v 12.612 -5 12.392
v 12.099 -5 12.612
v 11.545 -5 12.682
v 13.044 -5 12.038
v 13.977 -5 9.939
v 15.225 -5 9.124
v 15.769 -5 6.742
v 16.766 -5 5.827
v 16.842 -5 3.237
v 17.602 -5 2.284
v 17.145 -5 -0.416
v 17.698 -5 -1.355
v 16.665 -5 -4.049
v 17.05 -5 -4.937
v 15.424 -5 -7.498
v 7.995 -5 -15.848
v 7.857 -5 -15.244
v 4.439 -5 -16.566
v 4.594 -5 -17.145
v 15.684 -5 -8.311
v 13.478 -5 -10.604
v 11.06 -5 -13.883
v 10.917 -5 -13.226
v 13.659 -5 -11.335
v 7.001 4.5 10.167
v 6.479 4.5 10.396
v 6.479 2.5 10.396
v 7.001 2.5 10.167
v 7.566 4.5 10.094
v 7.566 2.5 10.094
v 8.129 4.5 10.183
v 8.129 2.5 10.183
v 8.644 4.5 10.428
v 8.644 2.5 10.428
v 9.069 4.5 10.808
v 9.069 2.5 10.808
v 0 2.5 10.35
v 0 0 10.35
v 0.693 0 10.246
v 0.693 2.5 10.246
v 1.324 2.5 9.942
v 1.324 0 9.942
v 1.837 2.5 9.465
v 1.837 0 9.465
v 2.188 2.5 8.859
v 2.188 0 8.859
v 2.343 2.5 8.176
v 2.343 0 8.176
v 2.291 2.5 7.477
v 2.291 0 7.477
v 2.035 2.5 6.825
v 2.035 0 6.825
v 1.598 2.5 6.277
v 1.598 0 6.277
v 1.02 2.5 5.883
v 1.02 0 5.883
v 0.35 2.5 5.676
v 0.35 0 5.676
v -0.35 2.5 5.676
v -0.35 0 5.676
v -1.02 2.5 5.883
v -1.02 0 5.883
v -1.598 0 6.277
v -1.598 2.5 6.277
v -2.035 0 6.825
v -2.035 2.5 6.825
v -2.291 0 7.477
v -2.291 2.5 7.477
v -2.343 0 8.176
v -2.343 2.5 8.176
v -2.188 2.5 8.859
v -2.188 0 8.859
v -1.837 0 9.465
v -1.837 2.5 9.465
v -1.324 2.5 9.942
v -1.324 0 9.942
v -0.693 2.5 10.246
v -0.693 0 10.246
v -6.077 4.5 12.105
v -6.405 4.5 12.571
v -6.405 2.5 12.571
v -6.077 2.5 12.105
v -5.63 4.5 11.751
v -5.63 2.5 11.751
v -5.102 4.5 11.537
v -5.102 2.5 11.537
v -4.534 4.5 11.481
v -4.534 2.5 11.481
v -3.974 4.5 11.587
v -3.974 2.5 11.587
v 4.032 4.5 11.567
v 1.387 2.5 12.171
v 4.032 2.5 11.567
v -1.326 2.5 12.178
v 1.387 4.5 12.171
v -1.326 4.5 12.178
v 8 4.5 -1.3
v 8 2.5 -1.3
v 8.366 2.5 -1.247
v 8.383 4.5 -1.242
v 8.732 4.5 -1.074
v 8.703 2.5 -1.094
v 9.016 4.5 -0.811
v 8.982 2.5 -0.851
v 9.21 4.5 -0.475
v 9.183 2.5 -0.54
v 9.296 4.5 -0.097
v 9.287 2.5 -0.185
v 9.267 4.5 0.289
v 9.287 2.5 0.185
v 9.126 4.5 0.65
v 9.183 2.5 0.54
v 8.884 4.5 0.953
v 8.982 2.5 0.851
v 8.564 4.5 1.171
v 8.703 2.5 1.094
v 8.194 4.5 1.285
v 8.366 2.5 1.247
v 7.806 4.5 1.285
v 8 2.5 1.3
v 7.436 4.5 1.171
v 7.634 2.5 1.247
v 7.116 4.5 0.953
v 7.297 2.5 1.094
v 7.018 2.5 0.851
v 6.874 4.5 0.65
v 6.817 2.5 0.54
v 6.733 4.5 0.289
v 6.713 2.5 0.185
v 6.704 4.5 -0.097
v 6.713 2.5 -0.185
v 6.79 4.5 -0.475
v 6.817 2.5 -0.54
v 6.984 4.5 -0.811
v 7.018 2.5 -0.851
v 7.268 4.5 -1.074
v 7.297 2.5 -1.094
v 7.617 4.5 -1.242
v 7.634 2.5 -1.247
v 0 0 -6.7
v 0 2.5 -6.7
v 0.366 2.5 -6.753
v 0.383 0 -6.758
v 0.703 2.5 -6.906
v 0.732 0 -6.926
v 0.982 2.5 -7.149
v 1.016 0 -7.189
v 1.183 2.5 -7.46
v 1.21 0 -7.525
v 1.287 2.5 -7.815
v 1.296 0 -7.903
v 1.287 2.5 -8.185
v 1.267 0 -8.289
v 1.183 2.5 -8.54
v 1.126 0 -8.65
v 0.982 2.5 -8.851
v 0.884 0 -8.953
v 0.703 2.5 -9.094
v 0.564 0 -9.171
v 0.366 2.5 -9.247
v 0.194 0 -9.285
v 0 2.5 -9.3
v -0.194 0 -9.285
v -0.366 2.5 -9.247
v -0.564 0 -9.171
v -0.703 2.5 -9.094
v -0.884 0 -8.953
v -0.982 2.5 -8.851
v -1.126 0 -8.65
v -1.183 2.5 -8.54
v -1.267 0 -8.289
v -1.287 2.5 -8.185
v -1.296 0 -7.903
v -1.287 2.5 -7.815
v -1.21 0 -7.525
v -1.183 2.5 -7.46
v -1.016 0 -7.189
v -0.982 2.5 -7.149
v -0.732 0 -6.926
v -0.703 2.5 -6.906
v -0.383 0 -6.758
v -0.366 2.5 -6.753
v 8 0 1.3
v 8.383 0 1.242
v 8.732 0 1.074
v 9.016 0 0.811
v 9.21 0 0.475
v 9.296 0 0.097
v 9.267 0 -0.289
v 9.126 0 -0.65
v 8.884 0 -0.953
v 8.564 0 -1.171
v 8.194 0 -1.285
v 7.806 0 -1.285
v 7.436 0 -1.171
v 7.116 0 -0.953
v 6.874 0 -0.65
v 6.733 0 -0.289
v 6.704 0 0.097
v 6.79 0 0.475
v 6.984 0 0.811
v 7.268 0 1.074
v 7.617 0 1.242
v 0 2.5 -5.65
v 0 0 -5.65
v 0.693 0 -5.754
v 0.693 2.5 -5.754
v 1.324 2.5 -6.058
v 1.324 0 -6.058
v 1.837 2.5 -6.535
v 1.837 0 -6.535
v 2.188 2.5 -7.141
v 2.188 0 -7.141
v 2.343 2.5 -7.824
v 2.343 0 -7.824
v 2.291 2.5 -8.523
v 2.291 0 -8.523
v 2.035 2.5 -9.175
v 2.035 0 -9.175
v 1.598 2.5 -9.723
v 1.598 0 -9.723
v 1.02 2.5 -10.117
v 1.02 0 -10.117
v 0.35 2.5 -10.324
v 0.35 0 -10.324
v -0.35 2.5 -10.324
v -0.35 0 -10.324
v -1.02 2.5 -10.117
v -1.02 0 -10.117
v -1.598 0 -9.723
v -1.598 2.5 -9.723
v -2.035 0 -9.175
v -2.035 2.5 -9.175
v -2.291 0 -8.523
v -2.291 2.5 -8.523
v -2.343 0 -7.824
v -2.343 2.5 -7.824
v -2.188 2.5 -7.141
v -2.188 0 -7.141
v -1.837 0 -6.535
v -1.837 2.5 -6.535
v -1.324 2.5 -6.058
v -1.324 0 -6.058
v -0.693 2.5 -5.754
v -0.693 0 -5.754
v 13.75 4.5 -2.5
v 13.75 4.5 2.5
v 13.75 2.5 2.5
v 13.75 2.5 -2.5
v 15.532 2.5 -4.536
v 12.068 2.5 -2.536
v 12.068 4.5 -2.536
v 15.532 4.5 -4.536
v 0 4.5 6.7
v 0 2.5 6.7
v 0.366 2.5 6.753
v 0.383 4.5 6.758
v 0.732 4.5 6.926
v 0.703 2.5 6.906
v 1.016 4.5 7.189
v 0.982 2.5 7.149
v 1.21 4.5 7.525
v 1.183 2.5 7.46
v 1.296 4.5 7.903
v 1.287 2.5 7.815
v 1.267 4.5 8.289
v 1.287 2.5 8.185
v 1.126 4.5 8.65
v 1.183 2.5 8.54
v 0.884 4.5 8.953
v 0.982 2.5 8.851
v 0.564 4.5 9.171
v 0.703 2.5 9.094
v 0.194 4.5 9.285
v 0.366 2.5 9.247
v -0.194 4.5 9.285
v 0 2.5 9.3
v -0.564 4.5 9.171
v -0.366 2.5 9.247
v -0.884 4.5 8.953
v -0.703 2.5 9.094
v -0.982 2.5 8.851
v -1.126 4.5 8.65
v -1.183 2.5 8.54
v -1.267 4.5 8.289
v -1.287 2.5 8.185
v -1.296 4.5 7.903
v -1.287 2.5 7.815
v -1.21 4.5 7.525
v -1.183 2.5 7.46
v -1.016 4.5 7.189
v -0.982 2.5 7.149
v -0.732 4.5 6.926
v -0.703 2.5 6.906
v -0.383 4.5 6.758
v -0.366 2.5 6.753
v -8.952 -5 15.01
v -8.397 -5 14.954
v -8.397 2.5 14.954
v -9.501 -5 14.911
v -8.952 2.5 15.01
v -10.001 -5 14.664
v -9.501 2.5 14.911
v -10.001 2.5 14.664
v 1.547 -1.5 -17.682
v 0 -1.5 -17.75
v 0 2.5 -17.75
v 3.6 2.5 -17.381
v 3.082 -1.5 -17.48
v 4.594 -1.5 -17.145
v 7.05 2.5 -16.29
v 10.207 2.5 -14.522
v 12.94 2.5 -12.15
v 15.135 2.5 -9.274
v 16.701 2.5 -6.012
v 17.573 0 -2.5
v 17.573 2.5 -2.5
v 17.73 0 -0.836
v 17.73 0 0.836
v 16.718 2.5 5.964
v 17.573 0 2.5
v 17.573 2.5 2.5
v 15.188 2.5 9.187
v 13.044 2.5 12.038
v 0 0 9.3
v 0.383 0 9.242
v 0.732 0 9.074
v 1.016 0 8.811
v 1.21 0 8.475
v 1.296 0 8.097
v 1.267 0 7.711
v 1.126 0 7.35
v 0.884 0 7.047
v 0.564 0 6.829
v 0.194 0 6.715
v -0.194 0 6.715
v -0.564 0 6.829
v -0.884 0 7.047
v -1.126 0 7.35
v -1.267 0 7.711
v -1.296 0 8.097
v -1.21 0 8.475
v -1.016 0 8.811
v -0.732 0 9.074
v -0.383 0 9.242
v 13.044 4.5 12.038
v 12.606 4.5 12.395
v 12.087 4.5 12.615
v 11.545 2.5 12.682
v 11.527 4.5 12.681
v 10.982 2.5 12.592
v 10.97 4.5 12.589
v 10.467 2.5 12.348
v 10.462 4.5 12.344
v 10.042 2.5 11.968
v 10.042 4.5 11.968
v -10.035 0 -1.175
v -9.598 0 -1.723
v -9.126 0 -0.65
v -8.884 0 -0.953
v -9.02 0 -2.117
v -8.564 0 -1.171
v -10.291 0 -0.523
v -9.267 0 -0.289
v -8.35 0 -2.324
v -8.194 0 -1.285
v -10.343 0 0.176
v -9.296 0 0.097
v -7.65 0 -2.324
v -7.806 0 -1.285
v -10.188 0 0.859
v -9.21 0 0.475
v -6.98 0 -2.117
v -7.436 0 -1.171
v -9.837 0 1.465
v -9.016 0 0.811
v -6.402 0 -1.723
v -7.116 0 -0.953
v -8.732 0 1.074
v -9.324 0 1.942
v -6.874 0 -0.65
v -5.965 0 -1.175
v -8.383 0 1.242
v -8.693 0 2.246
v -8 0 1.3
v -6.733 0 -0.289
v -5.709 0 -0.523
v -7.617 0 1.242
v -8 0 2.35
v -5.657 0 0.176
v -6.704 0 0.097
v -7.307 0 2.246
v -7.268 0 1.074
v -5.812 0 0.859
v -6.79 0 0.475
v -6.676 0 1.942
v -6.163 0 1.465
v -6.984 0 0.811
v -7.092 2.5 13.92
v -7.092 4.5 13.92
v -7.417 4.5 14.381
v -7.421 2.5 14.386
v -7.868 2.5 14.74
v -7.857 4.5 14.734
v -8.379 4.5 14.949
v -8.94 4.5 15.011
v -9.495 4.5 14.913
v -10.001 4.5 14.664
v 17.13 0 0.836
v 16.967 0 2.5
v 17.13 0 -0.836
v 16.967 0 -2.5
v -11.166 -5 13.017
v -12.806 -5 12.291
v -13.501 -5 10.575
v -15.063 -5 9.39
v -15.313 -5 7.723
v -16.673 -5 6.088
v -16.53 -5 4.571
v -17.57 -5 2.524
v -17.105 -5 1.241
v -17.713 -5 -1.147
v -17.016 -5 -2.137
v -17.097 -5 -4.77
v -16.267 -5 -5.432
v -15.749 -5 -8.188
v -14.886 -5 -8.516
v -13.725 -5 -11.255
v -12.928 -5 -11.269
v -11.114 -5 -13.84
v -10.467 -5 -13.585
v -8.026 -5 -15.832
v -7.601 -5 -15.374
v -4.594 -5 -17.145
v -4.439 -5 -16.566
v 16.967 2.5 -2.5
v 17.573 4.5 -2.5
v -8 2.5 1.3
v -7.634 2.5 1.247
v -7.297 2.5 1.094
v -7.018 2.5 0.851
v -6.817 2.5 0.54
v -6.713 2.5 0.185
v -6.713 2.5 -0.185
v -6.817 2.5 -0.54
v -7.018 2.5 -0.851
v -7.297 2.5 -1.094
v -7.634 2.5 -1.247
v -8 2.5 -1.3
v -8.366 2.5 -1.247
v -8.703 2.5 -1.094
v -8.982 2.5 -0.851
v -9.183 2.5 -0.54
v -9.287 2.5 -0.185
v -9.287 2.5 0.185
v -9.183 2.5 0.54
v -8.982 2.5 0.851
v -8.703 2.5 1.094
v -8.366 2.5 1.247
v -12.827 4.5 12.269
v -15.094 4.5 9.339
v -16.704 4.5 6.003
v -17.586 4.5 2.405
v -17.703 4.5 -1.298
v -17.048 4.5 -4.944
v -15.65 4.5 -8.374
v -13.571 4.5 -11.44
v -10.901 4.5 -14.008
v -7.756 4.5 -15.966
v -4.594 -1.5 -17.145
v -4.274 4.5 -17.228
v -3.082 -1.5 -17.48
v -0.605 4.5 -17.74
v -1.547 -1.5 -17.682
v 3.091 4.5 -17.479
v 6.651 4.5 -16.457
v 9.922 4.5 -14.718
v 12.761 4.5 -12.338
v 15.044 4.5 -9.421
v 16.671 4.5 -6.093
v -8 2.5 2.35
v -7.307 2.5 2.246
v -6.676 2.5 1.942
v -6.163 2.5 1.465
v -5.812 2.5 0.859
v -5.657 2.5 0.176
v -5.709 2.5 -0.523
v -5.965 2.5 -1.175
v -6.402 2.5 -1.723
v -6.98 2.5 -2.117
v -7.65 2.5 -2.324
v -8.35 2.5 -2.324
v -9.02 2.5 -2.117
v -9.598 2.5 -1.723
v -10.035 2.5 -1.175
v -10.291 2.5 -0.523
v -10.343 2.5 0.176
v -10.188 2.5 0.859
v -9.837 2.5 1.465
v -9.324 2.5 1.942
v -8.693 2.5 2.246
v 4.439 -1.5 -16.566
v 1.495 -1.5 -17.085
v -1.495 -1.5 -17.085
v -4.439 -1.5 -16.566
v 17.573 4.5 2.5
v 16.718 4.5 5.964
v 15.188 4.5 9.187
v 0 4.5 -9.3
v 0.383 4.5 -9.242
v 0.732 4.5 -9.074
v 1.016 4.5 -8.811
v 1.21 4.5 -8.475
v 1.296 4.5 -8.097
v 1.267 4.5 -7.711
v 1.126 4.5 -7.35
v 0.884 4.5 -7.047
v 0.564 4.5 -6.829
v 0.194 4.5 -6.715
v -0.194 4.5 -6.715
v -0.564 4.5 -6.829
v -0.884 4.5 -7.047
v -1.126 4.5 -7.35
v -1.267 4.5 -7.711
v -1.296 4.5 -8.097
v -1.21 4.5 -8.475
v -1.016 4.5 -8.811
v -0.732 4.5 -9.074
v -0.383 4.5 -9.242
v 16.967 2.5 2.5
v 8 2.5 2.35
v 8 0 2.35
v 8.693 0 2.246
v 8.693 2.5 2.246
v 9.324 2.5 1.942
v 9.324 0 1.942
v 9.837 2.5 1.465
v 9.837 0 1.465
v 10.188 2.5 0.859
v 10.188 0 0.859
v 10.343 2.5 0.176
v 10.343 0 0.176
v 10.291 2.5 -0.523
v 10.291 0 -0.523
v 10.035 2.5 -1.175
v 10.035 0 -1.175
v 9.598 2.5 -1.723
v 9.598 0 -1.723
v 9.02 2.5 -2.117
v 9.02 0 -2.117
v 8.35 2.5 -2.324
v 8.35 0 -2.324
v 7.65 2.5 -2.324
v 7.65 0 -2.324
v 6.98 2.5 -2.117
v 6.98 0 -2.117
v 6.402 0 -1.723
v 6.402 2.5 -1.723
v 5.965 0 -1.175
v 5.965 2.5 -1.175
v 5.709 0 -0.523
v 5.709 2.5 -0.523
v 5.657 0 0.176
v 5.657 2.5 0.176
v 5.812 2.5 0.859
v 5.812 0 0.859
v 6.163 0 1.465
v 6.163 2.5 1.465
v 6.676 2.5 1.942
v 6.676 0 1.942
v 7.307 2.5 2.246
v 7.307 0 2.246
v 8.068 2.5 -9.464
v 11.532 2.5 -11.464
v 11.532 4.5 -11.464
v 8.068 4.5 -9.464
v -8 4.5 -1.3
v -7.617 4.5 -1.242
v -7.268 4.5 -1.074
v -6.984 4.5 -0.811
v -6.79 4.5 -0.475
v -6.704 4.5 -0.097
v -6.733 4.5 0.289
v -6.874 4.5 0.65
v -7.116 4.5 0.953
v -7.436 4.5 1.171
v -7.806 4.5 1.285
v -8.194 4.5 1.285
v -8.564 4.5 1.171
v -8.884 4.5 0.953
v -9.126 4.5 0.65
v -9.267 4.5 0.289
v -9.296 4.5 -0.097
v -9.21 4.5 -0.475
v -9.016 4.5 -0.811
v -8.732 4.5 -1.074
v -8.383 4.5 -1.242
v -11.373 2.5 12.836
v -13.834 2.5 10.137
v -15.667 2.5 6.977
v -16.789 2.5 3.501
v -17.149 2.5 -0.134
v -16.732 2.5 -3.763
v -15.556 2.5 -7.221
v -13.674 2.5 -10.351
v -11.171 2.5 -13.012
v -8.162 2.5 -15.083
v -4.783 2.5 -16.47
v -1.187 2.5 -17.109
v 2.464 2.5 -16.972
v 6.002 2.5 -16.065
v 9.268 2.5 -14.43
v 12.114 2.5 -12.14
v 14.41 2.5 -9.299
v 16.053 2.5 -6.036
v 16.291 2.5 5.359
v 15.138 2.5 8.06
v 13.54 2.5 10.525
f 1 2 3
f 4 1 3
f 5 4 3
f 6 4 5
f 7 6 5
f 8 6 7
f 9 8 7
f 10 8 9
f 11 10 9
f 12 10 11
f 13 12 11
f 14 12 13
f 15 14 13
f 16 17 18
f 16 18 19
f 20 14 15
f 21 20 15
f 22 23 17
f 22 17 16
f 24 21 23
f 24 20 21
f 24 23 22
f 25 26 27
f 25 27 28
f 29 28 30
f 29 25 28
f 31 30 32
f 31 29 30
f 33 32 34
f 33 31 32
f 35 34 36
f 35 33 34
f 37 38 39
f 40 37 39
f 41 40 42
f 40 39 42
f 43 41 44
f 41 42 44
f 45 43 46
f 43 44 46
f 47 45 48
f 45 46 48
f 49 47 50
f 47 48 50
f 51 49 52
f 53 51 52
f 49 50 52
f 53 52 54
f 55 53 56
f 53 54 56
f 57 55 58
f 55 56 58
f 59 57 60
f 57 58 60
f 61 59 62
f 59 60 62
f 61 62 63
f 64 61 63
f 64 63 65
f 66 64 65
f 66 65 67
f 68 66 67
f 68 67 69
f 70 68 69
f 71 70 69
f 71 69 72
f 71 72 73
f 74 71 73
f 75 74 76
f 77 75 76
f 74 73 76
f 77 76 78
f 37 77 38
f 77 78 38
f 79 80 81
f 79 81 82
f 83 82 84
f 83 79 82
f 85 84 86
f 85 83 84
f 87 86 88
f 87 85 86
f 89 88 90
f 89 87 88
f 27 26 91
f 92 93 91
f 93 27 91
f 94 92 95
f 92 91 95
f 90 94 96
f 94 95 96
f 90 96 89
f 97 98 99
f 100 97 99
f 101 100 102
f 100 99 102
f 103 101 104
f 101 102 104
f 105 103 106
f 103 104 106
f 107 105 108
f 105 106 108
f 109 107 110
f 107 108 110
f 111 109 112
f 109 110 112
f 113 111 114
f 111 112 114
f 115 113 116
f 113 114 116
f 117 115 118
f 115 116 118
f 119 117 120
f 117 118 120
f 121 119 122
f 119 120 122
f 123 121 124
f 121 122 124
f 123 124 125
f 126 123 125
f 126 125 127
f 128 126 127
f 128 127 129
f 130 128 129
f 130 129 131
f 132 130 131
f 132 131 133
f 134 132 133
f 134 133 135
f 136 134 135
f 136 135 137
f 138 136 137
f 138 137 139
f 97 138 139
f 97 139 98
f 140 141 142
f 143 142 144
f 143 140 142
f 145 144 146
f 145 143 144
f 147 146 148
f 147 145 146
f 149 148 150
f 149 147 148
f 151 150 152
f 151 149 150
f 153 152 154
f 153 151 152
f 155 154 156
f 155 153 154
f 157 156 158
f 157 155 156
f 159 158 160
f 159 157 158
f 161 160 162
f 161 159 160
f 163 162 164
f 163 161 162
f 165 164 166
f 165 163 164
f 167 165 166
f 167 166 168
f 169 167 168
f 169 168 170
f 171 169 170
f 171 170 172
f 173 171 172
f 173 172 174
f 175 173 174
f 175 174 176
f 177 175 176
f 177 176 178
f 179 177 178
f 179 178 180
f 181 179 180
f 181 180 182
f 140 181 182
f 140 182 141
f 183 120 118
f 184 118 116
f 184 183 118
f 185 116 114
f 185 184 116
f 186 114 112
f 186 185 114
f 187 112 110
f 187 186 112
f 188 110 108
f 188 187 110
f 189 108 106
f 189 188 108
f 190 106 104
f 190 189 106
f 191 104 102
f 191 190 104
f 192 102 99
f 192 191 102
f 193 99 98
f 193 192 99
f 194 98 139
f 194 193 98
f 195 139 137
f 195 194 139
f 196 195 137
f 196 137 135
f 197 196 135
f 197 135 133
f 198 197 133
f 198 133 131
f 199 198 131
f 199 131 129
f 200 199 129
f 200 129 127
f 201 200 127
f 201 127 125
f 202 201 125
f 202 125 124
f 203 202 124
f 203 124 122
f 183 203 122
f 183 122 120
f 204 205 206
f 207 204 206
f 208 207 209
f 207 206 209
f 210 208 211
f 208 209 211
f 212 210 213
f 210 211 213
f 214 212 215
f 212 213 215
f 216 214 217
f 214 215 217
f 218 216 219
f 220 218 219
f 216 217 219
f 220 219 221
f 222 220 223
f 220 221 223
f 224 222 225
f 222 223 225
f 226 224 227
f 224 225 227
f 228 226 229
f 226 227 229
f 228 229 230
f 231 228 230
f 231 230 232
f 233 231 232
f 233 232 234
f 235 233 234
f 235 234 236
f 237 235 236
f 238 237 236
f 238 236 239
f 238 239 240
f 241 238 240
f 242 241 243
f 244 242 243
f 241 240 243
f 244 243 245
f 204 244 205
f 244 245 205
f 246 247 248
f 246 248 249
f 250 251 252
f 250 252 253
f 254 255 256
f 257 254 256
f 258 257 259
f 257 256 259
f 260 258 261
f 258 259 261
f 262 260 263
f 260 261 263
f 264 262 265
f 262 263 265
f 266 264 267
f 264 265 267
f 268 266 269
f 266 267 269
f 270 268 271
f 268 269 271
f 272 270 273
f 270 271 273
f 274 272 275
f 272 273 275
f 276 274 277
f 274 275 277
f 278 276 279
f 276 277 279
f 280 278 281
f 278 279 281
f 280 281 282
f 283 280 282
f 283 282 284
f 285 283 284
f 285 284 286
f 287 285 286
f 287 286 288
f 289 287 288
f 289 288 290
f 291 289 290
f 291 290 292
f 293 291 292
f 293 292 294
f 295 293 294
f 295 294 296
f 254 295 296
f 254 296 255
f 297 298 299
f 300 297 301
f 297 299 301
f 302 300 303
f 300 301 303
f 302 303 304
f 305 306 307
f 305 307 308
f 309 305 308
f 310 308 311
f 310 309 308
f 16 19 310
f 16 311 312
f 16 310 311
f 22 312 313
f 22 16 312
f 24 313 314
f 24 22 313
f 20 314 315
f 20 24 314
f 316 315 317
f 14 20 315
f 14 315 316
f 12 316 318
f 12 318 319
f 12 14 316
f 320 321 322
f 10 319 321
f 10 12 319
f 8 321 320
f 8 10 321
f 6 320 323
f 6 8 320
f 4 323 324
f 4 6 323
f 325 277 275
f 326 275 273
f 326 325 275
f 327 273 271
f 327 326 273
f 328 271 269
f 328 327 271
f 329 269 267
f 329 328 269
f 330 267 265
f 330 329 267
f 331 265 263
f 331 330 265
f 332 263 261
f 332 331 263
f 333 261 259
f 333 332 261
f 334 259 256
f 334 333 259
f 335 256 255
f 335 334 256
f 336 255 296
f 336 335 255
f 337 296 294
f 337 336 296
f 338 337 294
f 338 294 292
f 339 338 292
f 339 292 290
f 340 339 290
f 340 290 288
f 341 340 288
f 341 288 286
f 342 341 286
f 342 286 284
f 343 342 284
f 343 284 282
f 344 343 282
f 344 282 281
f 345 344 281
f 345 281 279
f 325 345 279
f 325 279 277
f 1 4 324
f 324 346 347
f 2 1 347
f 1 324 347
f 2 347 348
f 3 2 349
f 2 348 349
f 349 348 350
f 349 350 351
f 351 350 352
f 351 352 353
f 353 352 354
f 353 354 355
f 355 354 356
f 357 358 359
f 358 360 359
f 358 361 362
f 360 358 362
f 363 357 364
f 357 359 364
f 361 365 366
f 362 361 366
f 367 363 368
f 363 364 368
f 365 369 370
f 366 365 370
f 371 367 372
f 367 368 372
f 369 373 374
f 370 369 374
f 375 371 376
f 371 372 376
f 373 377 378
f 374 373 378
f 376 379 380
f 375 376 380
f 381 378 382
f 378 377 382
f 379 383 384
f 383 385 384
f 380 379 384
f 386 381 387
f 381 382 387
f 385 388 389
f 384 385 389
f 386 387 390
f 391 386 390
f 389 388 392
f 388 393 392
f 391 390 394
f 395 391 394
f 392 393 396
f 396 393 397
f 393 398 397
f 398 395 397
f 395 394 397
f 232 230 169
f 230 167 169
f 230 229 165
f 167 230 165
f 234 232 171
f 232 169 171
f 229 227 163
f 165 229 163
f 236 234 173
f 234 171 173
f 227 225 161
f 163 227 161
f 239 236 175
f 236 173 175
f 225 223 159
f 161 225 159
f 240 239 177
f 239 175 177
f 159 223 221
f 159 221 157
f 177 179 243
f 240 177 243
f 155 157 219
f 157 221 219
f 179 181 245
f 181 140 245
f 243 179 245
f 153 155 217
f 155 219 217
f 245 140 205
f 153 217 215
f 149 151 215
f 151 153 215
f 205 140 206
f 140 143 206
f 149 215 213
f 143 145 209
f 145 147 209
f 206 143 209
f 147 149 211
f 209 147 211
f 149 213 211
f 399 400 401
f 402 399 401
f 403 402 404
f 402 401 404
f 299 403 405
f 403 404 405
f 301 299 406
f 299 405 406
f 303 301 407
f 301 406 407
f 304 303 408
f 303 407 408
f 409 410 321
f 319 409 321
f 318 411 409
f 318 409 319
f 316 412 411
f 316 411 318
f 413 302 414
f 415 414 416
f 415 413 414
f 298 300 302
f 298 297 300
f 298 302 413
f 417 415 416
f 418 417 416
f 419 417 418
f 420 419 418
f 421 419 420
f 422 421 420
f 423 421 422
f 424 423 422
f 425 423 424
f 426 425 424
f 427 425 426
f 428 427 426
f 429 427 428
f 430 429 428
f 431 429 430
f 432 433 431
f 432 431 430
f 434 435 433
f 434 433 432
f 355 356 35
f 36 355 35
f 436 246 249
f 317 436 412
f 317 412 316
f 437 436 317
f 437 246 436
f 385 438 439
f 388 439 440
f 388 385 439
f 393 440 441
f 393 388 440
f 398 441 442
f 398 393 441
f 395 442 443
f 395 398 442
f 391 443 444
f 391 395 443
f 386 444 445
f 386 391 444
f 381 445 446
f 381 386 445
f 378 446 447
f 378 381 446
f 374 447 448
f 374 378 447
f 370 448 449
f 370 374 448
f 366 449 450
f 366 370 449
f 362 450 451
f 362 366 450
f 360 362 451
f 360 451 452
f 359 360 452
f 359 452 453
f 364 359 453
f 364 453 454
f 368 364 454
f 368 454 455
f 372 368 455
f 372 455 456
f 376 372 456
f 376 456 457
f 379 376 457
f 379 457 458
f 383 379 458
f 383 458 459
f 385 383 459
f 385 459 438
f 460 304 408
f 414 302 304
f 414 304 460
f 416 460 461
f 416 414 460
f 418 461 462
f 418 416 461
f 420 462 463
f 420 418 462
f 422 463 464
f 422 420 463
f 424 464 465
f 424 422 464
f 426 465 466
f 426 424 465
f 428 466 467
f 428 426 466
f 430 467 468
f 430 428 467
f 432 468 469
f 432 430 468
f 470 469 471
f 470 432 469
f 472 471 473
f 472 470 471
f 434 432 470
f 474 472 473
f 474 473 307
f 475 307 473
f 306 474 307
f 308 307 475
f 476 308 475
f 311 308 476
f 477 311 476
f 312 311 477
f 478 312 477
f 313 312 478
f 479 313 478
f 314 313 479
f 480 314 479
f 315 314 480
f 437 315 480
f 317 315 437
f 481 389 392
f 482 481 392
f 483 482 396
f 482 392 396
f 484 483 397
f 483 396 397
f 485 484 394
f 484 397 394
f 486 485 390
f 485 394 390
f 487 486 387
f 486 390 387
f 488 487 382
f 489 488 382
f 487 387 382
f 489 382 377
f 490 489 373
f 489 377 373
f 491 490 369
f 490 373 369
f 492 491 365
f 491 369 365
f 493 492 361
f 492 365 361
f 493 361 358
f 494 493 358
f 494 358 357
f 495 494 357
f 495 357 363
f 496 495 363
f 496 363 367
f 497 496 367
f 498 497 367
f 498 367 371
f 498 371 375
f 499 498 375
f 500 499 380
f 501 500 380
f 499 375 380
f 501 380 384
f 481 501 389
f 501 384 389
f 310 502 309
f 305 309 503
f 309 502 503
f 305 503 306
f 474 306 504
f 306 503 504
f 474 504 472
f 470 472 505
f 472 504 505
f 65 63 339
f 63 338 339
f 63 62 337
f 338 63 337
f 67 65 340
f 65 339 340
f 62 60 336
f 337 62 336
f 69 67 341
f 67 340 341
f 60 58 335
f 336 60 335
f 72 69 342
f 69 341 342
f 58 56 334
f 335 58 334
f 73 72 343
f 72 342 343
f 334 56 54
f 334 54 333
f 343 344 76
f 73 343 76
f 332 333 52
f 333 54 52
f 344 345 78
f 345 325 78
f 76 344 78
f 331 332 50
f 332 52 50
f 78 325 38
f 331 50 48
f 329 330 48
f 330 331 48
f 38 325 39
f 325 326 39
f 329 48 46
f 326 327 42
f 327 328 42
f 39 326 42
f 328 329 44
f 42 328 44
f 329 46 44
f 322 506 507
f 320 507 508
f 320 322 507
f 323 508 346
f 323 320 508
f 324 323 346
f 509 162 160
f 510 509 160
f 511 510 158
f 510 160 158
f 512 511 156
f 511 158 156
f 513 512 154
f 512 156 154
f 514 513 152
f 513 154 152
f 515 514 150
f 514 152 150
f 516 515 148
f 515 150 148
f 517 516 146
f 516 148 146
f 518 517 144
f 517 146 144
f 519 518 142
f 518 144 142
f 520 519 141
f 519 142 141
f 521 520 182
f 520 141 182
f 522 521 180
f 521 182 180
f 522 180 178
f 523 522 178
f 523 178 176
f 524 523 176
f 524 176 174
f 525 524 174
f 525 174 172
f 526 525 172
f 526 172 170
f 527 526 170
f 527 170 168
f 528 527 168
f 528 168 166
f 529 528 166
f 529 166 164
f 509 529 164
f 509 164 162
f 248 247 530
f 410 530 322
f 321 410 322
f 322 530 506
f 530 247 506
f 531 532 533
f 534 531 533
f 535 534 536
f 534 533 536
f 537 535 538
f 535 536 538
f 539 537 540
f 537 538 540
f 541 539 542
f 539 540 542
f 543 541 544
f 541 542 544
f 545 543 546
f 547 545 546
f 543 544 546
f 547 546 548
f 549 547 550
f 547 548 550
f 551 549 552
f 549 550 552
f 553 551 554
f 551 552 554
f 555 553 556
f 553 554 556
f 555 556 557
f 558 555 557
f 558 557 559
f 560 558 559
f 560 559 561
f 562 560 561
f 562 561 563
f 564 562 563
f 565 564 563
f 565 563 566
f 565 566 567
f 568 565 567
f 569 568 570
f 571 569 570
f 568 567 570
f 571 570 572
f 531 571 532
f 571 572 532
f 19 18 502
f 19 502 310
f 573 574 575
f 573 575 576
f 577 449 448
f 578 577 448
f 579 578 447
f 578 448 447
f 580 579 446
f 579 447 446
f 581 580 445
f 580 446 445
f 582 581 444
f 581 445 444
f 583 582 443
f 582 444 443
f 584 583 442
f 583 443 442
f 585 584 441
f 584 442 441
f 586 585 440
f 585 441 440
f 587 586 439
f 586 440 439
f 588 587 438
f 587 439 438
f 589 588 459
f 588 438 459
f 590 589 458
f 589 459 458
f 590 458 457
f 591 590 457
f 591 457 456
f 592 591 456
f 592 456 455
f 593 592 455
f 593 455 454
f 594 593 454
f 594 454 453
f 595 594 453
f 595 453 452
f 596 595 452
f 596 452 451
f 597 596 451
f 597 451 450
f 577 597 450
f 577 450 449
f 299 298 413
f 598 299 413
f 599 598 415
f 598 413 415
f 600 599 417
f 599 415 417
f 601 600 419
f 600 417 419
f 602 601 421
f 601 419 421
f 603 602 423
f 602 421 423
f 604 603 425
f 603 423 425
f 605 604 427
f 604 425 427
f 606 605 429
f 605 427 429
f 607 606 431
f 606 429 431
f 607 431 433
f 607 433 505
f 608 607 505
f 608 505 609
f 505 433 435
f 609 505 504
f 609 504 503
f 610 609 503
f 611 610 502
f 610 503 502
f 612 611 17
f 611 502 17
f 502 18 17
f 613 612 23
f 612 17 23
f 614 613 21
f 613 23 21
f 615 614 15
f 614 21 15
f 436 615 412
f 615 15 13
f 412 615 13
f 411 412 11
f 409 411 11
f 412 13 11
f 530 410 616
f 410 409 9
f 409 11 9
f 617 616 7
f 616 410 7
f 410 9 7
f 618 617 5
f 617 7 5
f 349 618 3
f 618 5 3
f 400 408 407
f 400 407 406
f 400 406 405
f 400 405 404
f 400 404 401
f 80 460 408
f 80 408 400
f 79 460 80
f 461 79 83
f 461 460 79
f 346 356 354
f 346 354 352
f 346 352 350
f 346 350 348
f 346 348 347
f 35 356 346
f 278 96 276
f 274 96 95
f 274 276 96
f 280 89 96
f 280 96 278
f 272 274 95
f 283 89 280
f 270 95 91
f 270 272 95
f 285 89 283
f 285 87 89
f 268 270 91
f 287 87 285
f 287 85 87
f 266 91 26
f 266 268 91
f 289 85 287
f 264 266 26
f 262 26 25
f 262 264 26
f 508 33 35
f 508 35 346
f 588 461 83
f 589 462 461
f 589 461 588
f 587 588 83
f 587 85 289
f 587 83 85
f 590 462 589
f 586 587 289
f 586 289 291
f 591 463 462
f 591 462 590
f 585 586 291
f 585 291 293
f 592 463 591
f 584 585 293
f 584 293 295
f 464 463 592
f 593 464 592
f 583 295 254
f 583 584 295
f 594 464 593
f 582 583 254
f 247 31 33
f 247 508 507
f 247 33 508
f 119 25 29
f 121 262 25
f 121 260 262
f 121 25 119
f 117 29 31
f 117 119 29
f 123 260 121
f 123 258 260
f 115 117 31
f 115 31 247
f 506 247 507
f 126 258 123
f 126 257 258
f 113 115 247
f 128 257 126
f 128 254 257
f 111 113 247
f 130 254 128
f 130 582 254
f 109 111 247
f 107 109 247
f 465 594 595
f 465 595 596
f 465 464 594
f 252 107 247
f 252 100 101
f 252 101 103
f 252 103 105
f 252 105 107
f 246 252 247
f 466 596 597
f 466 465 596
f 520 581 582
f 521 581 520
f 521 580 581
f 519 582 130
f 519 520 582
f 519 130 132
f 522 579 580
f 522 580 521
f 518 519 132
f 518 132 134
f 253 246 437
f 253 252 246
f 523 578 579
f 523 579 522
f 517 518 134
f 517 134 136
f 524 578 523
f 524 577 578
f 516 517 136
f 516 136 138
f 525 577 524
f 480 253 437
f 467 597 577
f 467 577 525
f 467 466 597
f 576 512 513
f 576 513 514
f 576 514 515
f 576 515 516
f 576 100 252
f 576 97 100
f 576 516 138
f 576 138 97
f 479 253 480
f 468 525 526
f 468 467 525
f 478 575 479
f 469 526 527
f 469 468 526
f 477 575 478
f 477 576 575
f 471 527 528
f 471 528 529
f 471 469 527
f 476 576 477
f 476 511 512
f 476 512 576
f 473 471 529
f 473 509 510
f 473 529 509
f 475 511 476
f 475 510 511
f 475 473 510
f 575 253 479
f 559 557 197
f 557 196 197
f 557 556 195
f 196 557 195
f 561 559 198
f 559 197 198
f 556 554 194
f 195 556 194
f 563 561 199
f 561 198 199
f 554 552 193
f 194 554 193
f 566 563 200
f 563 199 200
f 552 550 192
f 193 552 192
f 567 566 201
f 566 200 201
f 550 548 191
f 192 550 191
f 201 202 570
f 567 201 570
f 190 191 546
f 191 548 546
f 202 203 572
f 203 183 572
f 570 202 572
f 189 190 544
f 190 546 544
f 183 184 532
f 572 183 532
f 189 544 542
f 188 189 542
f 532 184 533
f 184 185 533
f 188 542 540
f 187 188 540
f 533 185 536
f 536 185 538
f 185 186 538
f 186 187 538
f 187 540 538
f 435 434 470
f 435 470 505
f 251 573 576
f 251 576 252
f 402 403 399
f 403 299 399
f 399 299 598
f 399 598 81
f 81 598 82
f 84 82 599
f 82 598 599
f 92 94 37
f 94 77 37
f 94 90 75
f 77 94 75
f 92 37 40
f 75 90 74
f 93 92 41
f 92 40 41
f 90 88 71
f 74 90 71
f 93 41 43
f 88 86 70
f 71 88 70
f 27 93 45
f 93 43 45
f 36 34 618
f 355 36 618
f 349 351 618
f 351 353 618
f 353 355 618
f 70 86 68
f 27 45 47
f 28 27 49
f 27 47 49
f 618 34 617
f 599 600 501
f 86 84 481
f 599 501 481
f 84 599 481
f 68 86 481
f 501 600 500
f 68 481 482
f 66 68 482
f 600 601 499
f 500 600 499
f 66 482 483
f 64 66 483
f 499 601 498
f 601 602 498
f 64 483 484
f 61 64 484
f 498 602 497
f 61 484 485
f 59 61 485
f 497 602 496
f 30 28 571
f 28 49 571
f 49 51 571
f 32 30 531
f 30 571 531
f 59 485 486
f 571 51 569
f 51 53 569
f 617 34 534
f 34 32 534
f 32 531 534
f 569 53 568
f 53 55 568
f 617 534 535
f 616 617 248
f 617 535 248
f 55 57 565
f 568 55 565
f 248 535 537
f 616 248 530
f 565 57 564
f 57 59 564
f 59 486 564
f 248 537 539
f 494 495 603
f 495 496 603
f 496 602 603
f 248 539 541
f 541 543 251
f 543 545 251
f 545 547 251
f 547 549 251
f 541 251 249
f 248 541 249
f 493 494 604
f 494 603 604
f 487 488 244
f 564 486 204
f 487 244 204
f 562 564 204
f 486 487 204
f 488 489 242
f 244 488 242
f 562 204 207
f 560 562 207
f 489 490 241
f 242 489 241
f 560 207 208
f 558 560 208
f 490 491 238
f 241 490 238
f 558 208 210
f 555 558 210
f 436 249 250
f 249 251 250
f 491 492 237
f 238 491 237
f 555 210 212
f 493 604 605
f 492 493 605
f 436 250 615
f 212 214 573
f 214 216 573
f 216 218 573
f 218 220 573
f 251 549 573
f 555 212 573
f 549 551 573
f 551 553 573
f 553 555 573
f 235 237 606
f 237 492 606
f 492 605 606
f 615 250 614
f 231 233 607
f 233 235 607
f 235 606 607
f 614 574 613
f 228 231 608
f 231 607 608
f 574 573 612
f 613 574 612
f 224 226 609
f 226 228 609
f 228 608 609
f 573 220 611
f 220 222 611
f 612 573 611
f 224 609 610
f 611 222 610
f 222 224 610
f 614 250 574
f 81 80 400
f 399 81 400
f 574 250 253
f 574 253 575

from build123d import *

# Parameters (mm, degrees)
SKETCH_1_R               = 2.35
SKETCH_1_R_2             = 1.3
EXTRUDE_1_DEPTH          = 2.5
EXTRUDE_1_2_DEPTH        = 2.5
EXTRUDE_1_3_DEPTH        = 2.5
EXTRUDE_1_4_DEPTH        = 2.5
SKETCH_2_R               = 17.75
EXTRUDE_2_DEPTH          = 2
SKETCH_3_R               = 1.3
CUT_EXTRUDE_1_DEPTH      = 26.226474189
CUT_EXTRUDE_2_DEPTH      = 26.502450863
CUT_EXTRUDE_2_DEPTH_BACK = 26.502450863
EXTRUDE_START            = 7.5
SKETCH_5_R               = 17.75
SKETCH_5_R_2             = 17.15
EXTRUDE_3_DEPTH          = 7.5
SKETCH_6_W               = 4
SKETCH_6_H               = 5
CUT_EXTRUDE_3_DEPTH      = 4.5
CUT_EXTRUDE_4_DEPTH      = 27.839802533
CUT_EXTRUDE_5_DEPTH      = 3.5
FILLET_1_R               = 2


with BuildPart() as part:
    # 草图1 → 凸台-拉伸1 (new body)
    with BuildSketch(Plane(origin=(0, 0, 0), x_dir=(1, 0, 0), z_dir=(0, 1, 0))):
        with Locations((0, 8)):
            Circle(SKETCH_1_R)
        with Locations((0, 8)):
            Circle(SKETCH_1_R_2, mode=Mode.SUBTRACT)
    extrude(amount=EXTRUDE_1_DEPTH)



with BuildPart() as body_2:
    # 草图1 → Extrude 1 2 (new body)
    with BuildSketch(Plane(origin=(0, 0, 0), x_dir=(1, 0, 0), z_dir=(0, 1, 0))):
        with Locations((8, 0)):
            Circle(SKETCH_1_R)
        with Locations((8, 0)):
            Circle(SKETCH_1_R_2, mode=Mode.SUBTRACT)
    extrude(amount=EXTRUDE_1_2_DEPTH)


with BuildPart() as body_3:
    # 草图1 → Extrude 1 3 (new body)
    with BuildSketch(Plane(origin=(0, 0, 0), x_dir=(1, 0, 0), z_dir=(0, 1, 0))):
        with Locations((0, -8)):
            Circle(SKETCH_1_R)
        with Locations((0, -8)):
            Circle(SKETCH_1_R_2, mode=Mode.SUBTRACT)
    extrude(amount=EXTRUDE_1_3_DEPTH)


with BuildPart() as body_4:
    # 草图1 → Extrude 1 4 (new body)
    with BuildSketch(Plane(origin=(0, 0, 0), x_dir=(1, 0, 0), z_dir=(0, 1, 0))):
        with Locations((-8, 0)):
            Circle(SKETCH_1_R)
        with Locations((-8, 0)):
            Circle(SKETCH_1_R_2, mode=Mode.SUBTRACT)
    extrude(amount=EXTRUDE_1_4_DEPTH)


with BuildPart() as part_1:
    add(part.part)

    add(body_2.part)  # 凸台-拉伸2 merges body 2

    add(body_3.part)  # 凸台-拉伸2 merges body 3

    add(body_4.part)  # 凸台-拉伸2 merges body 4
    # 草图2 → 凸台-拉伸2 (add)
    with BuildSketch(Plane(origin=(0, 2.5, 0), x_dir=(1, 0, 0), z_dir=(0, 1, 0))):
        Circle(SKETCH_2_R)
    extrude(amount=EXTRUDE_2_DEPTH)

    # 草图3 → 切除-拉伸1 (cut, through all)
    with BuildSketch(Plane.XZ.offset(-2.5)):
        with Locations((0, -8)):
            Circle(SKETCH_3_R)
        with Locations((8, 0)):
            Circle(SKETCH_3_R)
        with Locations((0, 8)):
            Circle(SKETCH_3_R)
        with Locations((-8, 0)):
            Circle(SKETCH_3_R)
    extrude(amount=-CUT_EXTRUDE_1_DEPTH, mode=Mode.SUBTRACT)

    # 草图4 → 切除-拉伸2 (cut, two sides: drawn at the far end of the back side and taken through both)
    with BuildSketch(Plane(origin=(0, 4.5, 0), x_dir=(1, 0, 0), z_dir=(0, 1, 0)).offset(-CUT_EXTRUDE_2_DEPTH_BACK)):
        Polygon((8.067949046, 9.464101393), (12.067949458, 2.535898401), (15.532050954, 4.535898607), (11.532050542, 11.464101599), align=None)
    extrude(amount=CUT_EXTRUDE_2_DEPTH + CUT_EXTRUDE_2_DEPTH_BACK, mode=Mode.SUBTRACT)

    # 草图5 → 凸台-拉伸3 (add)
    with BuildSketch(Plane.XZ.offset(-2.5).offset(EXTRUDE_START)):
        Circle(SKETCH_5_R)
        Circle(SKETCH_5_R_2, mode=Mode.SUBTRACT)
    extrude(amount=-EXTRUDE_3_DEPTH)

    # 草图6 → 切除-拉伸3 (cut)
    with BuildSketch(Plane(origin=(0, 4.5, 0), x_dir=(1, 0, 0), z_dir=(0, 1, 0))):
        with Locations((15.75, 0)):
            Rectangle(SKETCH_6_W, SKETCH_6_H)
    extrude(amount=-CUT_EXTRUDE_3_DEPTH, mode=Mode.SUBTRACT)

    # 草图7 → 切除-拉伸4 (cut, through all)
    with BuildSketch(Plane(origin=(0, 4.5, 0), x_dir=(1, 0, 0), z_dir=(0, 1, 0))):
        with BuildLine():
            Line((11.409480072, -13.597288865), (7.874148219, -9.384044428))
            ThreePointArc((7.874148219, -9.384044428), (1.386739369, -12.171255232), (-5.561383622, -10.914829921))
            Line((-5.561383622, -10.914829921), (-8.05833137, -15.815365804))
            ThreePointArc((-8.05833137, -15.815365804), (2.009357044, -17.635900438), (11.409480072, -13.597288865))
        make_face()
    extrude(amount=-CUT_EXTRUDE_4_DEPTH, mode=Mode.SUBTRACT)

    # 草图8 → 切除-拉伸5 (cut)
    with BuildSketch(Plane.XZ.offset(5)):
        with BuildLine():
            Line((-4.594038051, -17.145183417), (-4.438746624, -16.565627921))
            ThreePointArc((-4.438746624, -16.565627921), (0, -17.15), (4.438746624, -16.565627921))
            Line((4.438746624, -16.565627921), (4.594038051, -17.145183417))
            ThreePointArc((4.594038051, -17.145183417), (0, -17.75), (-4.594038051, -17.145183417))
        make_face()
    extrude(amount=-CUT_EXTRUDE_5_DEPTH, mode=Mode.SUBTRACT)

    # 圆角1
    fillet_1_edges = [part_1.edges().sort_by_distance(p)[0] for p in [
        (-5.561383622, 3.5, 10.914829921),
        (7.874148219, 3.5, 9.384044428),
    ]]
    fillet(fillet_1_edges, radius=FILLET_1_R)
    fillet_1_2_edges = [part_1.edges().sort_by_distance(p)[0] for p in [
        (-8.05833137, -0.25, 15.815365804),
        (11.409480072, -0.25, 13.597288865),
    ]]
    fillet(fillet_1_2_edges, radius=FILLET_1_R)


solid = part_1.part
